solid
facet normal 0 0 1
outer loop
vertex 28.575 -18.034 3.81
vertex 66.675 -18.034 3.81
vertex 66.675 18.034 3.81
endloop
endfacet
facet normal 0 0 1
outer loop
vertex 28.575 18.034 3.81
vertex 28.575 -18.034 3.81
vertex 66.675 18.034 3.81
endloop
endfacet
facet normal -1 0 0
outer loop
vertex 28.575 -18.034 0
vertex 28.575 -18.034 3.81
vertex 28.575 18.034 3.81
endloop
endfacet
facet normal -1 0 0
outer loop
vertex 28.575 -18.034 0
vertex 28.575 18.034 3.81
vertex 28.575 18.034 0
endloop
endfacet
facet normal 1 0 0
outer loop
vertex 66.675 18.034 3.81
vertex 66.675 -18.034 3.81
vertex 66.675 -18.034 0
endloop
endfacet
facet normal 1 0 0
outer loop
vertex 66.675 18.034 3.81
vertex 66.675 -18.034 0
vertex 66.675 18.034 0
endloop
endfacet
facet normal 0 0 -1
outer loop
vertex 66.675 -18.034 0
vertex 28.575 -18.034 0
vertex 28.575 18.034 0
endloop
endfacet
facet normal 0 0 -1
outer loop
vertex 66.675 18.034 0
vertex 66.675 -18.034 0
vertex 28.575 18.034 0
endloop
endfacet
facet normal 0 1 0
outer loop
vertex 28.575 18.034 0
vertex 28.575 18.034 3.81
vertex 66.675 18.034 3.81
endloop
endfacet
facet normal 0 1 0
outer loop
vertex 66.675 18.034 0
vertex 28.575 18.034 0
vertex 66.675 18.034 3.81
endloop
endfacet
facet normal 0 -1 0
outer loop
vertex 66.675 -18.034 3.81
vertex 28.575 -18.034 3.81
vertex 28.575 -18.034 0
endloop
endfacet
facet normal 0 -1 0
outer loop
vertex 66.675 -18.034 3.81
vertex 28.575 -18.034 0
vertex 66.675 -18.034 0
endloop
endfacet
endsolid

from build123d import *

# Parameters (mm, degrees)
SKETCH1_R                = 19.939
CIRCLE_EXTRUDE_DEPTH     = 12.7
SKETCH3_W                = 12.7
SKETCH3_H                = 39.878
RECTANGLE_EXTRUDE_DEPTH  = 68.58
SKETCH2_R                = 18.034
CRICLE_CUT_DEPTH         = 73.54012766
SKETCH4_OUTSIDE_W        = 110.101
SKETCH4_OUTSIDE_H        = 61.46
SKETCH4_OUTSIDE_W_2      = 66.675
SKETCH4_OUTSIDE_H_2      = 36.068
FRAME_CUT_DEPTH          = 73.54012766
SKETCH13_W               = 5.08
SKETCH13_H               = 36.068
BACK_CUT_DEPTH           = 38.1
SKETCH14_R               = 1.905
FOR_SPRING_EXTRUDE_DEPTH = 2.54
CUT_EXTRUDE1_DEPTH       = 77.861864725


with BuildPart() as part:
    # Sketch1 → circle extrude (new body)
    with BuildSketch(Plane.XY):
        Circle(SKETCH1_R)
    extrude(amount=CIRCLE_EXTRUDE_DEPTH)

    # Sketch3 → rectangle extrude (add)
    with BuildSketch(Plane(origin=(0, 0, 0), x_dir=(0, 0, -1), z_dir=(1, 0, 0))):
        with Locations((-6.35, 0)):
            Rectangle(SKETCH3_W, SKETCH3_H)
    extrude(amount=RECTANGLE_EXTRUDE_DEPTH)

    # Sketch2 → cricle cut (cut, through all)
    with BuildSketch(Plane.XY.offset(12.7)):
        Circle(SKETCH2_R)
    extrude(amount=-CRICLE_CUT_DEPTH, mode=Mode.SUBTRACT)

    # Sketch4 outside → frame cut (cut, through all)
    with BuildSketch(Plane.XY.offset(12.7)):
        with Locations((24.3205, 0)):
            Rectangle(SKETCH4_OUTSIDE_W, SKETCH4_OUTSIDE_H)
        with Locations((33.3375, 0)):
            Rectangle(SKETCH4_OUTSIDE_W_2, SKETCH4_OUTSIDE_H_2, mode=Mode.SUBTRACT)
    extrude(amount=-FRAME_CUT_DEPTH, mode=Mode.SUBTRACT)

    # Sketch13 → back cut (cut)
    with BuildSketch(Plane(origin=(66.675, 0, 0), x_dir=(0, 0, -1), z_dir=(1, 0, 0))):
        with Locations((-6.35, 0)):
            Rectangle(SKETCH13_W, SKETCH13_H)
    extrude(amount=-BACK_CUT_DEPTH, mode=Mode.SUBTRACT)

    # Sketch14 → for spring extrude (add)
    with BuildSketch(Plane(origin=(28.575, 0, 0), x_dir=(0, 0, -1), z_dir=(1, 0, 0))):
        with Locations((-6.35, 0)):
            Circle(SKETCH14_R)
    extrude(amount=FOR_SPRING_EXTRUDE_DEPTH)

    # Sketch15 → Cut-Extrude1 (cut, through all)
    with BuildSketch(Plane(origin=(0, 18.034, 0), x_dir=(1, 0, 0), z_dir=(0, 1, 0))):
        Polygon((28.575, 0), (0, 0), (0, -12.7), (28.575, -12.7), (68.688895239, -12.7), (68.688895239, -4.445), (28.575, -4.445), align=None)
    extrude(amount=-CUT_EXTRUDE1_DEPTH, mode=Mode.SUBTRACT)


solid = part.part
